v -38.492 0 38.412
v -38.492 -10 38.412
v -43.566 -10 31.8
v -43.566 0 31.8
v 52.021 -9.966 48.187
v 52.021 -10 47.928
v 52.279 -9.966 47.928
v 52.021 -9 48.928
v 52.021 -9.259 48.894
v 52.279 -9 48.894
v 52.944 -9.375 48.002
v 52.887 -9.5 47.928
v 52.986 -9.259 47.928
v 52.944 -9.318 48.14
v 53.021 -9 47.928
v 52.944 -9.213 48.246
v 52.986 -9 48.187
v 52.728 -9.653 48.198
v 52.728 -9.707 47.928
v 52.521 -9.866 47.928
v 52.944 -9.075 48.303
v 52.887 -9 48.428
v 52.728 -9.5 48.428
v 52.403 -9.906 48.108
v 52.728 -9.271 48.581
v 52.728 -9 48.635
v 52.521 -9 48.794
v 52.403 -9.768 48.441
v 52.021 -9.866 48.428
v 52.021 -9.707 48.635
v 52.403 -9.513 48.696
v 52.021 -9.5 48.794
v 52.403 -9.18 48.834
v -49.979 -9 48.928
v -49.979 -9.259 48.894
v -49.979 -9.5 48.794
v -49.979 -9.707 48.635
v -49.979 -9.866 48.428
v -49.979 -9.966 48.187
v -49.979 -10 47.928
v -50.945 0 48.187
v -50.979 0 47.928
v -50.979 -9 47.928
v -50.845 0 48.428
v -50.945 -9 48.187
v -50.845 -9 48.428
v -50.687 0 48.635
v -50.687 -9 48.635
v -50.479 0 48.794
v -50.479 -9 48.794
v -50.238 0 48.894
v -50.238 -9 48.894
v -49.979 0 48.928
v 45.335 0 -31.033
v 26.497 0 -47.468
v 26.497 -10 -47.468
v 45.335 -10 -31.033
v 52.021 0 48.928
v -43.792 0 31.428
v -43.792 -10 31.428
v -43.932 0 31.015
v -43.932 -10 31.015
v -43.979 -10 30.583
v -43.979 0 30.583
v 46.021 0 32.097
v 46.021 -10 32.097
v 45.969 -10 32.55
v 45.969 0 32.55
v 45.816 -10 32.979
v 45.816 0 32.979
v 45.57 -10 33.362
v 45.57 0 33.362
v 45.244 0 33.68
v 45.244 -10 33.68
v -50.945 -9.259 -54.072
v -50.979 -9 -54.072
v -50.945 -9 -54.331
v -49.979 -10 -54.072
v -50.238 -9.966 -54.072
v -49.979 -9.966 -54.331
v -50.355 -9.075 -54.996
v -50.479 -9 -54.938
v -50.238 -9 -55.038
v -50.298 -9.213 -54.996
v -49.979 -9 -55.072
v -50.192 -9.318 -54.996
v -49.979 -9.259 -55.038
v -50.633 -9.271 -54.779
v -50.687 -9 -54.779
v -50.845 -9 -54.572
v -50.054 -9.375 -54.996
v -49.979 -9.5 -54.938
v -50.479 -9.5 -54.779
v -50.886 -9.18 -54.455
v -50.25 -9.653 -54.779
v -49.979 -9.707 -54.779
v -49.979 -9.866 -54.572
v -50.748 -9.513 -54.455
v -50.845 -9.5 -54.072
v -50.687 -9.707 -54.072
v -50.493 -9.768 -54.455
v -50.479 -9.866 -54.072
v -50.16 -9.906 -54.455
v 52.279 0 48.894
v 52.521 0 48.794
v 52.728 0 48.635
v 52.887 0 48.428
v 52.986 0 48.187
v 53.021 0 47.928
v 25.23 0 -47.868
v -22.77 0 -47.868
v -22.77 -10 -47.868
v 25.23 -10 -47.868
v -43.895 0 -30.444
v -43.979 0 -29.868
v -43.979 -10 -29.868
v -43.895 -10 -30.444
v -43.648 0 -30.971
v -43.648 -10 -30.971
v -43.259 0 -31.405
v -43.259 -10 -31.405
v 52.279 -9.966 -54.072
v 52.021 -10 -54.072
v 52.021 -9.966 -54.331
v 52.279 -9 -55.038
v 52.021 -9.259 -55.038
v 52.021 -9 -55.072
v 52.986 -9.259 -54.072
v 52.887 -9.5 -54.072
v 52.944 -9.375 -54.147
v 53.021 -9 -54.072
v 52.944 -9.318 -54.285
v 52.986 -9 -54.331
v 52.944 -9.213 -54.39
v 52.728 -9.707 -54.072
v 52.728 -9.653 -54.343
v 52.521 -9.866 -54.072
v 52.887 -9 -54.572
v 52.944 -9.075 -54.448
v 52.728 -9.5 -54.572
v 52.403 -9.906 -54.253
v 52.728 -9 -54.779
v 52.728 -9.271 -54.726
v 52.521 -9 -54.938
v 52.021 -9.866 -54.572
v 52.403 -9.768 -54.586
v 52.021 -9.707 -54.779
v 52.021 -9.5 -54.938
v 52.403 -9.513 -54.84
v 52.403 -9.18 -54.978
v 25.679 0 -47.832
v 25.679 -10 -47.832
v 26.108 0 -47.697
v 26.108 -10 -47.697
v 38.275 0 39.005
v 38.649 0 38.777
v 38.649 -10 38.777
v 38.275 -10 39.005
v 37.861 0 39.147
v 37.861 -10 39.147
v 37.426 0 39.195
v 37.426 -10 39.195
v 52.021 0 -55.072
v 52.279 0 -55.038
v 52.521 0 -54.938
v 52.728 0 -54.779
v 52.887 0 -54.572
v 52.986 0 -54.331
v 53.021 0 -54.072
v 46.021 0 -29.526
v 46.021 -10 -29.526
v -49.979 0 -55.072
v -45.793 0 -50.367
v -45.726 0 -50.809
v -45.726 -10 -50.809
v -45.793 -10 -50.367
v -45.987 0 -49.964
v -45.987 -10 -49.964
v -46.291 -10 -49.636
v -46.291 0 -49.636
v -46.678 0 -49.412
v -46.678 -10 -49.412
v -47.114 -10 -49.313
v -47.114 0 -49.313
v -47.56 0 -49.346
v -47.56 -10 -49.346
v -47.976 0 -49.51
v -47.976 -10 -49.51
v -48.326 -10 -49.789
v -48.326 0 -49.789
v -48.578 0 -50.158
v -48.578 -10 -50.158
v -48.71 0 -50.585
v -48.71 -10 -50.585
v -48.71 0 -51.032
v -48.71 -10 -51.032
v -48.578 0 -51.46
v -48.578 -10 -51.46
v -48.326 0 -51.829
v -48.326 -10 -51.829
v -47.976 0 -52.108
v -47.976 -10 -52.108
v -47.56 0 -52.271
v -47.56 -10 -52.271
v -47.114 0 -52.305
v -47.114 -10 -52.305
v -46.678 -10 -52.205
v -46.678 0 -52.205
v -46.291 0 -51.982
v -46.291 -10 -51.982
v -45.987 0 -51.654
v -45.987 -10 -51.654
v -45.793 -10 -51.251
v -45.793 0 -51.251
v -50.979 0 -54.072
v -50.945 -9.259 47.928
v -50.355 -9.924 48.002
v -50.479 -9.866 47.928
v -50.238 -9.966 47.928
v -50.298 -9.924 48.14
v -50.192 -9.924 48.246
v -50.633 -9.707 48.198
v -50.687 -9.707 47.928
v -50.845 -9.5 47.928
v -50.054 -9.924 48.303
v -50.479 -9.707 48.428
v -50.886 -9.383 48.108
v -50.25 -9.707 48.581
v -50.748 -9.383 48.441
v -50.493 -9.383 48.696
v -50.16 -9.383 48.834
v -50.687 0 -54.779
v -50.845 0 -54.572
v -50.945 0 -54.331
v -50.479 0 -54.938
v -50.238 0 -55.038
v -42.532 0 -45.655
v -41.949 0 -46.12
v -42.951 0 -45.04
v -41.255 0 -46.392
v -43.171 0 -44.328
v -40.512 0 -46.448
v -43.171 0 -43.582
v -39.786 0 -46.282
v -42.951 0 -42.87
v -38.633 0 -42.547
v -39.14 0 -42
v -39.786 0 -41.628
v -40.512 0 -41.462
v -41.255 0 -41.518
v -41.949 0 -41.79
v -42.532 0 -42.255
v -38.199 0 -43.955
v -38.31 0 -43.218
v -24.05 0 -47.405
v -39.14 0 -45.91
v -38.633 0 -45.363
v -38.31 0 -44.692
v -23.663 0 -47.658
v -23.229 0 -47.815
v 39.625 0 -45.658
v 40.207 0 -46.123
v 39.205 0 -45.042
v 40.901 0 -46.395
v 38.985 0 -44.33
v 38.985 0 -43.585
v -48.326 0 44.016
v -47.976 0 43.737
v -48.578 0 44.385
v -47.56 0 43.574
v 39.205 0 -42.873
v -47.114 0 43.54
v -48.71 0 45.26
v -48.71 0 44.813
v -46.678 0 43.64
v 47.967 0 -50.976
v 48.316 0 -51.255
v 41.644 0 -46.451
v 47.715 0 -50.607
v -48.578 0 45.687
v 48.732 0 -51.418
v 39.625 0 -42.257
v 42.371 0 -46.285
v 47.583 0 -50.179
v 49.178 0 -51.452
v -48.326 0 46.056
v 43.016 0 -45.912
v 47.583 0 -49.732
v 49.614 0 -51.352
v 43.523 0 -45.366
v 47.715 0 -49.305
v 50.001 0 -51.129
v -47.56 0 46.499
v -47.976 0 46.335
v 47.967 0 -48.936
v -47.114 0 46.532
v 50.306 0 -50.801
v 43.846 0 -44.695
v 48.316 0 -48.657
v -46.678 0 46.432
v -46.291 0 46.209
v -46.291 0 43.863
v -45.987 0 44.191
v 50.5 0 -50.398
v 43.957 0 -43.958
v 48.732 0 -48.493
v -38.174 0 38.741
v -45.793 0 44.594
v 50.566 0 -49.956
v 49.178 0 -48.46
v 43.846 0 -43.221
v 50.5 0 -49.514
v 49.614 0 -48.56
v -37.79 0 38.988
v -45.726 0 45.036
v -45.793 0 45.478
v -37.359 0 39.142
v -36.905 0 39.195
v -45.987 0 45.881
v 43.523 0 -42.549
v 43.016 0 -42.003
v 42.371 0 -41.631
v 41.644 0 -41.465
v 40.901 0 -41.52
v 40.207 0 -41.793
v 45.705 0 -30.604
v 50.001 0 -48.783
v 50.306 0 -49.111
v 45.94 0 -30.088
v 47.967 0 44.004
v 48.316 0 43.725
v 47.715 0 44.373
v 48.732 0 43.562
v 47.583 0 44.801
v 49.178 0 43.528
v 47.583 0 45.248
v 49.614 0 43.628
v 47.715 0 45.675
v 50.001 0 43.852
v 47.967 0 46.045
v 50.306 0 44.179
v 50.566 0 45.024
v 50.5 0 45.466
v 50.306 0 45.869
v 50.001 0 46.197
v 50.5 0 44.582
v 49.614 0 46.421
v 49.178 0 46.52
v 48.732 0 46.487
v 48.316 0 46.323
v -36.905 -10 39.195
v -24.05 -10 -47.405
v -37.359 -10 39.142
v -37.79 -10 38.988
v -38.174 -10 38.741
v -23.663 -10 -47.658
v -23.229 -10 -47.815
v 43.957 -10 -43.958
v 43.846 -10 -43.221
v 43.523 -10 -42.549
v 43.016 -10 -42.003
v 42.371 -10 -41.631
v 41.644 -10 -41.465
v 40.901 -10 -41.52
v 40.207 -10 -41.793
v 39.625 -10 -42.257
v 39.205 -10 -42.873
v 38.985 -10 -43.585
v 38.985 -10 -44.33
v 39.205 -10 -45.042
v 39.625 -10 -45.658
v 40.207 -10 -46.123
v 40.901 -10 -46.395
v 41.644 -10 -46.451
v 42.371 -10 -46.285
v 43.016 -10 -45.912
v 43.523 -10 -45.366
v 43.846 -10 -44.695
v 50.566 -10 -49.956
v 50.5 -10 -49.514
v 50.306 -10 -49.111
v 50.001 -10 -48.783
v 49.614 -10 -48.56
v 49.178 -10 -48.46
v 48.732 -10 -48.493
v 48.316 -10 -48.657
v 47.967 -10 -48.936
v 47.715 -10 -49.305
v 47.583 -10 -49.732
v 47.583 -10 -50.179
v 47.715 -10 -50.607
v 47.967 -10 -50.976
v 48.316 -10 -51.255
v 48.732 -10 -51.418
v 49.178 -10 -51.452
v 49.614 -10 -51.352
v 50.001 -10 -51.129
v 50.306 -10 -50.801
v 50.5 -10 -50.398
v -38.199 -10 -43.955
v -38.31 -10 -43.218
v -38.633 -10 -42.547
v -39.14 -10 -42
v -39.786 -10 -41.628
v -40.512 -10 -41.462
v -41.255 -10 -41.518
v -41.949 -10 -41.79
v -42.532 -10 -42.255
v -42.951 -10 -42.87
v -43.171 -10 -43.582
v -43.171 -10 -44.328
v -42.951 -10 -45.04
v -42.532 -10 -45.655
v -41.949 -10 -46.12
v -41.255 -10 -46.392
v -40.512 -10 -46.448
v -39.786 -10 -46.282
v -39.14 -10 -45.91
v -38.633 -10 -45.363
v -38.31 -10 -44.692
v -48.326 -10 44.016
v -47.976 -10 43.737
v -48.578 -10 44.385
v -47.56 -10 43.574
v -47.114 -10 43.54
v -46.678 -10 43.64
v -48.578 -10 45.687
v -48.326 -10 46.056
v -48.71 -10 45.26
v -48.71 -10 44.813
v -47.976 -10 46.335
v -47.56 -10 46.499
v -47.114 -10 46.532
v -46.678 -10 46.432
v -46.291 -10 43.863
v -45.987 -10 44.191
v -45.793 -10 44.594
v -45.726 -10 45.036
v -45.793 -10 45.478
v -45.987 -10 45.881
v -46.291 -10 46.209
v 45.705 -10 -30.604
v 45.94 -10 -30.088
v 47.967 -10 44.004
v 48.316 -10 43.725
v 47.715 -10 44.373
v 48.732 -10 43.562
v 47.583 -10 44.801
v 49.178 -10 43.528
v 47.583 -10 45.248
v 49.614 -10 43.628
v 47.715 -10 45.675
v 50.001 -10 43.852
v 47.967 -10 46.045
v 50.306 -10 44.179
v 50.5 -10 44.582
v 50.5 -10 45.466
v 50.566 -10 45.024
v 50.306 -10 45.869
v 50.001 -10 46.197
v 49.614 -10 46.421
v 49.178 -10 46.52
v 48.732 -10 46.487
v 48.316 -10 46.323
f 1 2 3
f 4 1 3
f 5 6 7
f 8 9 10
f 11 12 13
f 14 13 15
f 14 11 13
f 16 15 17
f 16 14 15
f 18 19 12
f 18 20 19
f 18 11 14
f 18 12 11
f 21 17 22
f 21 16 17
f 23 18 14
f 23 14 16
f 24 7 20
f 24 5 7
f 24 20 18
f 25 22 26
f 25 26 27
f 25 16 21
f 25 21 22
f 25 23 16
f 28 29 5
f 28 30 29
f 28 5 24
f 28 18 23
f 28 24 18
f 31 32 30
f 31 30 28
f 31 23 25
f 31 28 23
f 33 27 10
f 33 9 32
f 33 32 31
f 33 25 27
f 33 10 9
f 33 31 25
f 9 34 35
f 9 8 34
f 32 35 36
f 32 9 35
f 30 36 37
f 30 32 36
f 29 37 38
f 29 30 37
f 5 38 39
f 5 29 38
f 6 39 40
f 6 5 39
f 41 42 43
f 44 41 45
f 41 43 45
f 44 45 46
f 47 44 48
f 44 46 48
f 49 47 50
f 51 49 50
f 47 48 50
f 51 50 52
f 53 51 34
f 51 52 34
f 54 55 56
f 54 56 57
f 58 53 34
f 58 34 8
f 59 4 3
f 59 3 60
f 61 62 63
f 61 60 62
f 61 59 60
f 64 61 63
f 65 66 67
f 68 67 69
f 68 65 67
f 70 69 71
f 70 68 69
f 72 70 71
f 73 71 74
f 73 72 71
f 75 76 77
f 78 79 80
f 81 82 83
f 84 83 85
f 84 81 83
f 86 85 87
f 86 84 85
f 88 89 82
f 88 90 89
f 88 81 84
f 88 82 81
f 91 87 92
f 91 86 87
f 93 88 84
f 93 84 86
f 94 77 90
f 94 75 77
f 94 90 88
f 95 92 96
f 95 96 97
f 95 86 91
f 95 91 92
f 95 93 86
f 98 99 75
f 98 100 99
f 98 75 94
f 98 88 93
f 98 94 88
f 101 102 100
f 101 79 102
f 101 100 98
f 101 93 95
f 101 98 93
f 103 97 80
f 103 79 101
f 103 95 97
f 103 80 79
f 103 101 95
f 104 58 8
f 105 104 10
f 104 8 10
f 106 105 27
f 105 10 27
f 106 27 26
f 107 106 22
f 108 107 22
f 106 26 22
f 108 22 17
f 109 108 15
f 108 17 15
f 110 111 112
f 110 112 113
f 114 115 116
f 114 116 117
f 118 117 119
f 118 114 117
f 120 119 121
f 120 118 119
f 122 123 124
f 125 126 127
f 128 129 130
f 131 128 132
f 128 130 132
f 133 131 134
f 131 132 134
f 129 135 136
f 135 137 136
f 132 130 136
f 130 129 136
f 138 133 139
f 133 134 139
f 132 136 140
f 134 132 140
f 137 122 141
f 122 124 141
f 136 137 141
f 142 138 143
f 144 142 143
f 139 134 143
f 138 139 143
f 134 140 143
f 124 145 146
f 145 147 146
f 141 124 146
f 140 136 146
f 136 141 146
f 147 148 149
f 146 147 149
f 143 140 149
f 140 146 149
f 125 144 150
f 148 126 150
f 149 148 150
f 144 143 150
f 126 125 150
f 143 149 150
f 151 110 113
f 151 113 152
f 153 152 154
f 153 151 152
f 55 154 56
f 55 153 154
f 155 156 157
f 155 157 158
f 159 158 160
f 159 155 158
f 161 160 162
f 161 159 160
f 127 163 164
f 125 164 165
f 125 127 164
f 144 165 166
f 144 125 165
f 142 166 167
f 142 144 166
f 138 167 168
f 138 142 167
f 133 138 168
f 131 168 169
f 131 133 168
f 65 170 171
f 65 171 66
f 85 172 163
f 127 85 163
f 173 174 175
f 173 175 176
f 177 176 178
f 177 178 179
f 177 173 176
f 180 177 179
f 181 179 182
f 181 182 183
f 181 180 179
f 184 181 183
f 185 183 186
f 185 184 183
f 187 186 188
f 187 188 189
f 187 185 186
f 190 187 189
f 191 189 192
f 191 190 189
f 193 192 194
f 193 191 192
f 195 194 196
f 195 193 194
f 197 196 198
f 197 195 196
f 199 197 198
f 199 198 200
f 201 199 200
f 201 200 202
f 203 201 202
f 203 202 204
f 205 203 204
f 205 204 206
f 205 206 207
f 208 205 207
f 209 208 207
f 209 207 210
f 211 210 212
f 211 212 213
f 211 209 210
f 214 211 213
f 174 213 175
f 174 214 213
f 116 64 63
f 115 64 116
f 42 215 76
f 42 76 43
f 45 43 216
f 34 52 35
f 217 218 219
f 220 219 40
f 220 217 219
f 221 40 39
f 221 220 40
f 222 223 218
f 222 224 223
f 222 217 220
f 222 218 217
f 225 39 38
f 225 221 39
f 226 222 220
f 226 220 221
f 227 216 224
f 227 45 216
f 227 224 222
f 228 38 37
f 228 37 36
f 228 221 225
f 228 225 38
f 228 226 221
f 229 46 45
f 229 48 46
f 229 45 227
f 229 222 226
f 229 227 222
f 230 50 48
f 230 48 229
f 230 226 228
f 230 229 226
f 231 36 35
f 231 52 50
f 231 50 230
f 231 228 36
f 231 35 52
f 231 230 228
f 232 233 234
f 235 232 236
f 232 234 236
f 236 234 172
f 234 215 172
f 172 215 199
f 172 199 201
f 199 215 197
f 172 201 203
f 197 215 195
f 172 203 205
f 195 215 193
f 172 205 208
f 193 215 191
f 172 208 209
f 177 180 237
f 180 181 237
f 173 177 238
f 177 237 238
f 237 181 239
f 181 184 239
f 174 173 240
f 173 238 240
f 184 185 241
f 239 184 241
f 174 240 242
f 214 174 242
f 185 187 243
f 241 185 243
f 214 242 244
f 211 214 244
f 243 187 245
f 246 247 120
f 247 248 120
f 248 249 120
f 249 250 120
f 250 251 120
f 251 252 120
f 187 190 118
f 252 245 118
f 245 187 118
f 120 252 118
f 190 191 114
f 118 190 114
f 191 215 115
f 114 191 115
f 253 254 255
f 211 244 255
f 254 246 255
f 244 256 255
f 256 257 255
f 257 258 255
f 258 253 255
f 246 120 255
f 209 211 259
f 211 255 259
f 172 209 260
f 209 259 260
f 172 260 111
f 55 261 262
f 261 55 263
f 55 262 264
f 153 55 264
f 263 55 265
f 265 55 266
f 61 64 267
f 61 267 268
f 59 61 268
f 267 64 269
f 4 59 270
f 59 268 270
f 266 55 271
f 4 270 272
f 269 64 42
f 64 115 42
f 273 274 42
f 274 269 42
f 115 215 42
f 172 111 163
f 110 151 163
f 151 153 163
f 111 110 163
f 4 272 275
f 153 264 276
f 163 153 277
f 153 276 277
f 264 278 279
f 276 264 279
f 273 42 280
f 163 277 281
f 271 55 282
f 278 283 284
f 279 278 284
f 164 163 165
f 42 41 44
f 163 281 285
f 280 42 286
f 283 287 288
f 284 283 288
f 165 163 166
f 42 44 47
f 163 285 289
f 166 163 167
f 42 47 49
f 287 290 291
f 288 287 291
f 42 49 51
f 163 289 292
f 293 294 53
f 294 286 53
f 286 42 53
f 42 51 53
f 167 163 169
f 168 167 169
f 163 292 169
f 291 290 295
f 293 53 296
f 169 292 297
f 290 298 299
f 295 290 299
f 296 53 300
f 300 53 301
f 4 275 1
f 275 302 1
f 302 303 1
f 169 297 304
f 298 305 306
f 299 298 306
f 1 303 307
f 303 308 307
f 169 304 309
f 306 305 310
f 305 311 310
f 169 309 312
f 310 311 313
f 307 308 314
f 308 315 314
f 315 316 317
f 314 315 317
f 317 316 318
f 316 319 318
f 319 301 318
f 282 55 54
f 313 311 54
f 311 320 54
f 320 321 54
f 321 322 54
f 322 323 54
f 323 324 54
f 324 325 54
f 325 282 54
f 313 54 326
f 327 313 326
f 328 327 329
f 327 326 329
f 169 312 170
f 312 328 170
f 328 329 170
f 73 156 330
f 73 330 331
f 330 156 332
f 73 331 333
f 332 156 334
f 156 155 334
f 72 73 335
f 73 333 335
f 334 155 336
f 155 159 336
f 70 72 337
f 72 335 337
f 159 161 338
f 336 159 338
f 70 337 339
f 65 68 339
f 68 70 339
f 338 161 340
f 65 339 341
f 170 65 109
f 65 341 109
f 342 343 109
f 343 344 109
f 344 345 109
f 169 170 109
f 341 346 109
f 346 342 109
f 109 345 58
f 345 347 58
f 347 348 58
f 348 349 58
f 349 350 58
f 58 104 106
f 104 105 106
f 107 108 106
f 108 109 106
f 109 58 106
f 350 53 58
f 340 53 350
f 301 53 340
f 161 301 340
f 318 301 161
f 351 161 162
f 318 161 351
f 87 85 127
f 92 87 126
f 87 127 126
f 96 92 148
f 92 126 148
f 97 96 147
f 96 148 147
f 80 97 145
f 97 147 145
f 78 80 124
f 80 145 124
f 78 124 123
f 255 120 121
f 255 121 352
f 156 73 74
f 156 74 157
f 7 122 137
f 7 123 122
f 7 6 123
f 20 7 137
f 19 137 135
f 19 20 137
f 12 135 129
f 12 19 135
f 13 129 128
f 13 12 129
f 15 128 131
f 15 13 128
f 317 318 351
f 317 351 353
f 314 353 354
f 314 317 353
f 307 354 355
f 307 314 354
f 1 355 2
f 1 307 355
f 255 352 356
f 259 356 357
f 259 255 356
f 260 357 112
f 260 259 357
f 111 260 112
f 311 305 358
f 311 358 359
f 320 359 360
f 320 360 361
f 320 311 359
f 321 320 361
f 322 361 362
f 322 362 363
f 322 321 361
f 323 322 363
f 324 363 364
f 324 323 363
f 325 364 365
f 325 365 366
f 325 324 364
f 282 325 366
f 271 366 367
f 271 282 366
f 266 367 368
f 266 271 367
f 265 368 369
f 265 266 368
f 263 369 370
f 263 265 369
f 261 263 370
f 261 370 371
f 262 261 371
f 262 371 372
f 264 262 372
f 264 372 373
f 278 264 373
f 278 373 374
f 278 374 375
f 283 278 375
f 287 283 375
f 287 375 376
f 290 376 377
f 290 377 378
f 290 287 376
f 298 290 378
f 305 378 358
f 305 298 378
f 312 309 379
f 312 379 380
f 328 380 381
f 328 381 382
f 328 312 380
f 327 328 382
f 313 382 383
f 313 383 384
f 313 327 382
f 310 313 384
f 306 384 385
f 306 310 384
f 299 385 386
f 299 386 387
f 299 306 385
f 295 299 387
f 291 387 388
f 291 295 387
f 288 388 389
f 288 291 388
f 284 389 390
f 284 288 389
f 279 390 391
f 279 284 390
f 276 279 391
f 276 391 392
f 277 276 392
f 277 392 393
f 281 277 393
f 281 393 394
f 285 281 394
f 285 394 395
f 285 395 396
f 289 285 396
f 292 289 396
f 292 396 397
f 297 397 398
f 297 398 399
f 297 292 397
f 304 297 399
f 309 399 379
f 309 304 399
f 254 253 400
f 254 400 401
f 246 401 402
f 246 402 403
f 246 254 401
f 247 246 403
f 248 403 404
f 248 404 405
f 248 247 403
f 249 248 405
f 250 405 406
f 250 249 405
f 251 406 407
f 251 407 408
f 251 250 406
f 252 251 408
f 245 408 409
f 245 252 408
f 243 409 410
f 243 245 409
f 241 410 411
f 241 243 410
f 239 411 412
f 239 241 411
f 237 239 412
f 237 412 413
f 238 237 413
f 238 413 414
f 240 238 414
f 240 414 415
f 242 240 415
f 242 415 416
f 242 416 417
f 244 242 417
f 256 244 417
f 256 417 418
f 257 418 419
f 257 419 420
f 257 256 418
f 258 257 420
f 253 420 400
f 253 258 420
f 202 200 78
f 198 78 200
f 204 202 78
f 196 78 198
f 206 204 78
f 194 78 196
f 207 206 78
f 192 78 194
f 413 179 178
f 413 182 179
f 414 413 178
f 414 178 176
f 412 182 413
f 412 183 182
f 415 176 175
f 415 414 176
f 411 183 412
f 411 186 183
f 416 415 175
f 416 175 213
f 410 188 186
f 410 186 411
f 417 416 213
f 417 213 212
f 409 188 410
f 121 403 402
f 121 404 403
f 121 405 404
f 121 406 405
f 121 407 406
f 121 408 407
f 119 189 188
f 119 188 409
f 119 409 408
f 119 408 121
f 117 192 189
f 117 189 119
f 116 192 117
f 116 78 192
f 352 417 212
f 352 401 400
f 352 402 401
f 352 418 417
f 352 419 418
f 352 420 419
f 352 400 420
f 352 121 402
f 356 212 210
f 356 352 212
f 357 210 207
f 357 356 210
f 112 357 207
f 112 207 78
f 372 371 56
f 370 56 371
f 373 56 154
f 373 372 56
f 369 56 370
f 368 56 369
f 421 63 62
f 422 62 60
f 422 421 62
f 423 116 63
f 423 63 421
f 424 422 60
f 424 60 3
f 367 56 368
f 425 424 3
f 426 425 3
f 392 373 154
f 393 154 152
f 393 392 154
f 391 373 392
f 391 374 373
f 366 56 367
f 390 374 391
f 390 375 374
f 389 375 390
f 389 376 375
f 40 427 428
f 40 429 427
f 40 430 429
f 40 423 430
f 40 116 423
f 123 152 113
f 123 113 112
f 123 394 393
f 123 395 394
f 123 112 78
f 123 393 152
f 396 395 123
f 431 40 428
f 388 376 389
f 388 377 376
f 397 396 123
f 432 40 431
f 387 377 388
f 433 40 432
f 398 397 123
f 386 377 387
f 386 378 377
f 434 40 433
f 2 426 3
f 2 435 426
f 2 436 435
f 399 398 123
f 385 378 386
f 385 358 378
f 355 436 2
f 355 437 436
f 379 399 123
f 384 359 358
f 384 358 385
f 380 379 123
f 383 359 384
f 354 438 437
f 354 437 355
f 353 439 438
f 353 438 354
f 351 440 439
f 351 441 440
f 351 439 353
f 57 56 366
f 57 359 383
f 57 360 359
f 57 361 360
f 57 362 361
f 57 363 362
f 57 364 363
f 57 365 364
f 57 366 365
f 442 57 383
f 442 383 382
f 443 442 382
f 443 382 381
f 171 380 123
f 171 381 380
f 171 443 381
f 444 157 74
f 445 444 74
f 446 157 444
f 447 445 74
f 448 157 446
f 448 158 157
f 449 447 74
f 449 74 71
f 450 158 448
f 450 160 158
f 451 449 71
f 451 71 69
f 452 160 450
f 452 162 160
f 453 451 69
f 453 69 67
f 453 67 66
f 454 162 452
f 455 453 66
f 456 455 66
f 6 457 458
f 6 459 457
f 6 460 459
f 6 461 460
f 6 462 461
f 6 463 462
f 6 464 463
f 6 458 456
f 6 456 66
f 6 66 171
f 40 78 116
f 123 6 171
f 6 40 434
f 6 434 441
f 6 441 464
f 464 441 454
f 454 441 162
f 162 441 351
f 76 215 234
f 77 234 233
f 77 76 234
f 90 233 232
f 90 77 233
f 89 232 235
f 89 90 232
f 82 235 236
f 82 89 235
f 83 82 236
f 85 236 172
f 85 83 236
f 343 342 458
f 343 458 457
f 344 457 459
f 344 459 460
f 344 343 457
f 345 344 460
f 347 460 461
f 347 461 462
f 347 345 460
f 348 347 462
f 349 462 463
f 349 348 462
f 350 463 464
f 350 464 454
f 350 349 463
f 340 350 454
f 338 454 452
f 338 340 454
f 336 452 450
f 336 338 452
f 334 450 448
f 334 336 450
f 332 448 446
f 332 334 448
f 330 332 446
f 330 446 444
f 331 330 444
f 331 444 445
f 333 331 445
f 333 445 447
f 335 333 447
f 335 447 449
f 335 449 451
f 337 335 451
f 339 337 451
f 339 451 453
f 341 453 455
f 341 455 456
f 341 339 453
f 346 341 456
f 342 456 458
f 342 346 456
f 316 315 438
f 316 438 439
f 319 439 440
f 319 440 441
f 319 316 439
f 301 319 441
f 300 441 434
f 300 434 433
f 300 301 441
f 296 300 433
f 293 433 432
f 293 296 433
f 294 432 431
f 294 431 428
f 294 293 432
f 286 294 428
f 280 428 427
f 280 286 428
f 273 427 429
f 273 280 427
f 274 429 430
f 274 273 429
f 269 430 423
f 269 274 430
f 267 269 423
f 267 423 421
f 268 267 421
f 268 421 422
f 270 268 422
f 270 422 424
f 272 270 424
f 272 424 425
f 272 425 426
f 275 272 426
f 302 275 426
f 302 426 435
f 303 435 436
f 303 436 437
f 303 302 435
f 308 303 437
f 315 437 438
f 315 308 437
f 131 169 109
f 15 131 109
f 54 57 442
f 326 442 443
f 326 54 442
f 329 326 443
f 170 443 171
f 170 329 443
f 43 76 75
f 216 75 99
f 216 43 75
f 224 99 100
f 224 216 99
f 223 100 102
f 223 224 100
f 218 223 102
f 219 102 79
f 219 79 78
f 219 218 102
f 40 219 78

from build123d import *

# Parameters (mm, degrees)
F0_W        = 104
F0_H        = 104
F0_R        = 1.5
F0_R_2      = 2.5
F2_DEPTH    = 10
F2_FACE_W   = 104
F2_FACE_H   = 104
F2_FACE_R   = 1.5
F2_FACE_R_2 = 2.5
F3_DEPTH    = 25
F4_R        = 1


with BuildPart() as f2:
    # F0 (on Front) → F2 (new body)
    with BuildSketch(Plane.XZ):
        with Locations((1.0205563903, -3.0722830892)):
            Rectangle(F0_W, F0_H)
        with Locations((-47.2263507545, -50.8087884027)):
            Circle(F0_R, mode=Mode.SUBTRACT)
        with Locations((-40.6989715993, -43.9550094306)):
            Circle(F0_R_2, mode=Mode.SUBTRACT)
        with Locations((49.0661785007, -49.9558521996)):
            Circle(F0_R, mode=Mode.SUBTRACT)
        with Locations((41.4574928582, -43.9577177167)):
            Circle(F0_R_2, mode=Mode.SUBTRACT)
        with Locations((-47.2263507545, 45.0361557305)):
            Circle(F0_R, mode=Mode.SUBTRACT)
        with Locations((49.0661785007, 45.0242571533)):
            Circle(F0_R, mode=Mode.SUBTRACT)
    extrude(amount=F2_DEPTH)

    # F1 (on Front) + F2_face (on face) → F3 (cut)
    with BuildSketch(Plane.XZ):
        with BuildLine():
            Line((37.4257260145, 39.1947293328), (-36.9051963783, 39.1947293328))
            ThreePointArc((-36.9051963783, 39.1947293328), (-37.7897278988, 38.9884974308), (-38.4918408014, 38.4123333221))
            Line((-38.4918408014, 38.4123333221), (-43.5660880328, 31.8001456637))
            ThreePointArc((-43.5660880328, 31.8001456637), (-43.873287432, 31.2254690241), (-43.9794436097, 30.5825416744))
            Line((-43.9794436097, 30.5825416744), (-43.9794436097, -29.8682280959))
            ThreePointArc((-43.9794436097, -29.8682280959), (-43.7905206373, -30.7167562333), (-43.2594436097, -31.4049779128))
            Line((-43.2594436097, -31.4049779128), (-24.0500708974, -47.4049779128))
            ThreePointArc((-24.0500708974, -47.4049779128), (-23.4506957449, -47.7488529433), (-22.7700708974, -47.8682280959))
            Line((-22.7700708974, -47.8682280959), (25.2299291026, -47.8682280959))
            ThreePointArc((25.2299291026, -47.8682280959), (25.8975098604, -47.7764802387), (26.4967279793, -47.4682280959))
            Line((26.4967279793, -47.4682280959), (45.3353493779, -31.0333157505))
            ThreePointArc((45.3353493779, -31.0333157505), (45.8412136858, -30.3539983577), (46.0205563903, -29.5262260386))
            Line((46.0205563903, -29.5262260386), (46.0205563903, 32.097225442))
            ThreePointArc((46.0205563903, 32.097225442), (45.815861416, 32.9786333298), (45.2436765256, 33.6796214527))
            Line((45.2436765256, 33.6796214527), (38.6488461498, 38.7771253435))
            ThreePointArc((38.6488461498, 38.7771253435), (38.071948878, 39.0874511853), (37.4257260145, 39.1947293328))
        make_face()
    with BuildSketch(Plane(origin=(1.0231641347, -10, -2.9239537764), x_dir=(1, 0, 0), z_dir=(0, -1, 0))):
        with Locations((-0.0026077444, -0.1483293127)):
            Rectangle(F2_FACE_W, F2_FACE_H)
        with Locations((-48.2495148892, -47.8848346262)):
            Circle(F2_FACE_R, mode=Mode.SUBTRACT)
        with Locations((-41.7221357341, -41.0310556542)):
            Circle(F2_FACE_R_2, mode=Mode.SUBTRACT)
        with Locations((48.0430143659, -47.0318984232)):
            Circle(F2_FACE_R, mode=Mode.SUBTRACT)
        with Locations((40.4343287234, -41.0337639403)):
            Circle(F2_FACE_R_2, mode=Mode.SUBTRACT)
        with Locations((-48.2495148892, 47.9601095069)):
            Circle(F2_FACE_R, mode=Mode.SUBTRACT)
        with Locations((48.0430143659, 47.9482109297)):
            Circle(F2_FACE_R, mode=Mode.SUBTRACT)
    extrude(amount=F3_DEPTH, mode=Mode.SUBTRACT)

    # F4
    f4_edges = [f2.edges().sort_by_distance(p)[0] for p in [
        (-50.979444, -5, 48.927717),
        (-50.979444, -10, -3.072283),
        (1.020556, -10, 48.927717),
        (-50.979444, -5, -55.072283),
        (1.020556, -10, -55.072283),
        (53.020556, -10, -3.072283),
        (53.020556, -5, 48.927717),
        (53.020556, -5, -55.072283),
    ]]
    fillet(f4_edges, radius=F4_R)


solid = f2.part
